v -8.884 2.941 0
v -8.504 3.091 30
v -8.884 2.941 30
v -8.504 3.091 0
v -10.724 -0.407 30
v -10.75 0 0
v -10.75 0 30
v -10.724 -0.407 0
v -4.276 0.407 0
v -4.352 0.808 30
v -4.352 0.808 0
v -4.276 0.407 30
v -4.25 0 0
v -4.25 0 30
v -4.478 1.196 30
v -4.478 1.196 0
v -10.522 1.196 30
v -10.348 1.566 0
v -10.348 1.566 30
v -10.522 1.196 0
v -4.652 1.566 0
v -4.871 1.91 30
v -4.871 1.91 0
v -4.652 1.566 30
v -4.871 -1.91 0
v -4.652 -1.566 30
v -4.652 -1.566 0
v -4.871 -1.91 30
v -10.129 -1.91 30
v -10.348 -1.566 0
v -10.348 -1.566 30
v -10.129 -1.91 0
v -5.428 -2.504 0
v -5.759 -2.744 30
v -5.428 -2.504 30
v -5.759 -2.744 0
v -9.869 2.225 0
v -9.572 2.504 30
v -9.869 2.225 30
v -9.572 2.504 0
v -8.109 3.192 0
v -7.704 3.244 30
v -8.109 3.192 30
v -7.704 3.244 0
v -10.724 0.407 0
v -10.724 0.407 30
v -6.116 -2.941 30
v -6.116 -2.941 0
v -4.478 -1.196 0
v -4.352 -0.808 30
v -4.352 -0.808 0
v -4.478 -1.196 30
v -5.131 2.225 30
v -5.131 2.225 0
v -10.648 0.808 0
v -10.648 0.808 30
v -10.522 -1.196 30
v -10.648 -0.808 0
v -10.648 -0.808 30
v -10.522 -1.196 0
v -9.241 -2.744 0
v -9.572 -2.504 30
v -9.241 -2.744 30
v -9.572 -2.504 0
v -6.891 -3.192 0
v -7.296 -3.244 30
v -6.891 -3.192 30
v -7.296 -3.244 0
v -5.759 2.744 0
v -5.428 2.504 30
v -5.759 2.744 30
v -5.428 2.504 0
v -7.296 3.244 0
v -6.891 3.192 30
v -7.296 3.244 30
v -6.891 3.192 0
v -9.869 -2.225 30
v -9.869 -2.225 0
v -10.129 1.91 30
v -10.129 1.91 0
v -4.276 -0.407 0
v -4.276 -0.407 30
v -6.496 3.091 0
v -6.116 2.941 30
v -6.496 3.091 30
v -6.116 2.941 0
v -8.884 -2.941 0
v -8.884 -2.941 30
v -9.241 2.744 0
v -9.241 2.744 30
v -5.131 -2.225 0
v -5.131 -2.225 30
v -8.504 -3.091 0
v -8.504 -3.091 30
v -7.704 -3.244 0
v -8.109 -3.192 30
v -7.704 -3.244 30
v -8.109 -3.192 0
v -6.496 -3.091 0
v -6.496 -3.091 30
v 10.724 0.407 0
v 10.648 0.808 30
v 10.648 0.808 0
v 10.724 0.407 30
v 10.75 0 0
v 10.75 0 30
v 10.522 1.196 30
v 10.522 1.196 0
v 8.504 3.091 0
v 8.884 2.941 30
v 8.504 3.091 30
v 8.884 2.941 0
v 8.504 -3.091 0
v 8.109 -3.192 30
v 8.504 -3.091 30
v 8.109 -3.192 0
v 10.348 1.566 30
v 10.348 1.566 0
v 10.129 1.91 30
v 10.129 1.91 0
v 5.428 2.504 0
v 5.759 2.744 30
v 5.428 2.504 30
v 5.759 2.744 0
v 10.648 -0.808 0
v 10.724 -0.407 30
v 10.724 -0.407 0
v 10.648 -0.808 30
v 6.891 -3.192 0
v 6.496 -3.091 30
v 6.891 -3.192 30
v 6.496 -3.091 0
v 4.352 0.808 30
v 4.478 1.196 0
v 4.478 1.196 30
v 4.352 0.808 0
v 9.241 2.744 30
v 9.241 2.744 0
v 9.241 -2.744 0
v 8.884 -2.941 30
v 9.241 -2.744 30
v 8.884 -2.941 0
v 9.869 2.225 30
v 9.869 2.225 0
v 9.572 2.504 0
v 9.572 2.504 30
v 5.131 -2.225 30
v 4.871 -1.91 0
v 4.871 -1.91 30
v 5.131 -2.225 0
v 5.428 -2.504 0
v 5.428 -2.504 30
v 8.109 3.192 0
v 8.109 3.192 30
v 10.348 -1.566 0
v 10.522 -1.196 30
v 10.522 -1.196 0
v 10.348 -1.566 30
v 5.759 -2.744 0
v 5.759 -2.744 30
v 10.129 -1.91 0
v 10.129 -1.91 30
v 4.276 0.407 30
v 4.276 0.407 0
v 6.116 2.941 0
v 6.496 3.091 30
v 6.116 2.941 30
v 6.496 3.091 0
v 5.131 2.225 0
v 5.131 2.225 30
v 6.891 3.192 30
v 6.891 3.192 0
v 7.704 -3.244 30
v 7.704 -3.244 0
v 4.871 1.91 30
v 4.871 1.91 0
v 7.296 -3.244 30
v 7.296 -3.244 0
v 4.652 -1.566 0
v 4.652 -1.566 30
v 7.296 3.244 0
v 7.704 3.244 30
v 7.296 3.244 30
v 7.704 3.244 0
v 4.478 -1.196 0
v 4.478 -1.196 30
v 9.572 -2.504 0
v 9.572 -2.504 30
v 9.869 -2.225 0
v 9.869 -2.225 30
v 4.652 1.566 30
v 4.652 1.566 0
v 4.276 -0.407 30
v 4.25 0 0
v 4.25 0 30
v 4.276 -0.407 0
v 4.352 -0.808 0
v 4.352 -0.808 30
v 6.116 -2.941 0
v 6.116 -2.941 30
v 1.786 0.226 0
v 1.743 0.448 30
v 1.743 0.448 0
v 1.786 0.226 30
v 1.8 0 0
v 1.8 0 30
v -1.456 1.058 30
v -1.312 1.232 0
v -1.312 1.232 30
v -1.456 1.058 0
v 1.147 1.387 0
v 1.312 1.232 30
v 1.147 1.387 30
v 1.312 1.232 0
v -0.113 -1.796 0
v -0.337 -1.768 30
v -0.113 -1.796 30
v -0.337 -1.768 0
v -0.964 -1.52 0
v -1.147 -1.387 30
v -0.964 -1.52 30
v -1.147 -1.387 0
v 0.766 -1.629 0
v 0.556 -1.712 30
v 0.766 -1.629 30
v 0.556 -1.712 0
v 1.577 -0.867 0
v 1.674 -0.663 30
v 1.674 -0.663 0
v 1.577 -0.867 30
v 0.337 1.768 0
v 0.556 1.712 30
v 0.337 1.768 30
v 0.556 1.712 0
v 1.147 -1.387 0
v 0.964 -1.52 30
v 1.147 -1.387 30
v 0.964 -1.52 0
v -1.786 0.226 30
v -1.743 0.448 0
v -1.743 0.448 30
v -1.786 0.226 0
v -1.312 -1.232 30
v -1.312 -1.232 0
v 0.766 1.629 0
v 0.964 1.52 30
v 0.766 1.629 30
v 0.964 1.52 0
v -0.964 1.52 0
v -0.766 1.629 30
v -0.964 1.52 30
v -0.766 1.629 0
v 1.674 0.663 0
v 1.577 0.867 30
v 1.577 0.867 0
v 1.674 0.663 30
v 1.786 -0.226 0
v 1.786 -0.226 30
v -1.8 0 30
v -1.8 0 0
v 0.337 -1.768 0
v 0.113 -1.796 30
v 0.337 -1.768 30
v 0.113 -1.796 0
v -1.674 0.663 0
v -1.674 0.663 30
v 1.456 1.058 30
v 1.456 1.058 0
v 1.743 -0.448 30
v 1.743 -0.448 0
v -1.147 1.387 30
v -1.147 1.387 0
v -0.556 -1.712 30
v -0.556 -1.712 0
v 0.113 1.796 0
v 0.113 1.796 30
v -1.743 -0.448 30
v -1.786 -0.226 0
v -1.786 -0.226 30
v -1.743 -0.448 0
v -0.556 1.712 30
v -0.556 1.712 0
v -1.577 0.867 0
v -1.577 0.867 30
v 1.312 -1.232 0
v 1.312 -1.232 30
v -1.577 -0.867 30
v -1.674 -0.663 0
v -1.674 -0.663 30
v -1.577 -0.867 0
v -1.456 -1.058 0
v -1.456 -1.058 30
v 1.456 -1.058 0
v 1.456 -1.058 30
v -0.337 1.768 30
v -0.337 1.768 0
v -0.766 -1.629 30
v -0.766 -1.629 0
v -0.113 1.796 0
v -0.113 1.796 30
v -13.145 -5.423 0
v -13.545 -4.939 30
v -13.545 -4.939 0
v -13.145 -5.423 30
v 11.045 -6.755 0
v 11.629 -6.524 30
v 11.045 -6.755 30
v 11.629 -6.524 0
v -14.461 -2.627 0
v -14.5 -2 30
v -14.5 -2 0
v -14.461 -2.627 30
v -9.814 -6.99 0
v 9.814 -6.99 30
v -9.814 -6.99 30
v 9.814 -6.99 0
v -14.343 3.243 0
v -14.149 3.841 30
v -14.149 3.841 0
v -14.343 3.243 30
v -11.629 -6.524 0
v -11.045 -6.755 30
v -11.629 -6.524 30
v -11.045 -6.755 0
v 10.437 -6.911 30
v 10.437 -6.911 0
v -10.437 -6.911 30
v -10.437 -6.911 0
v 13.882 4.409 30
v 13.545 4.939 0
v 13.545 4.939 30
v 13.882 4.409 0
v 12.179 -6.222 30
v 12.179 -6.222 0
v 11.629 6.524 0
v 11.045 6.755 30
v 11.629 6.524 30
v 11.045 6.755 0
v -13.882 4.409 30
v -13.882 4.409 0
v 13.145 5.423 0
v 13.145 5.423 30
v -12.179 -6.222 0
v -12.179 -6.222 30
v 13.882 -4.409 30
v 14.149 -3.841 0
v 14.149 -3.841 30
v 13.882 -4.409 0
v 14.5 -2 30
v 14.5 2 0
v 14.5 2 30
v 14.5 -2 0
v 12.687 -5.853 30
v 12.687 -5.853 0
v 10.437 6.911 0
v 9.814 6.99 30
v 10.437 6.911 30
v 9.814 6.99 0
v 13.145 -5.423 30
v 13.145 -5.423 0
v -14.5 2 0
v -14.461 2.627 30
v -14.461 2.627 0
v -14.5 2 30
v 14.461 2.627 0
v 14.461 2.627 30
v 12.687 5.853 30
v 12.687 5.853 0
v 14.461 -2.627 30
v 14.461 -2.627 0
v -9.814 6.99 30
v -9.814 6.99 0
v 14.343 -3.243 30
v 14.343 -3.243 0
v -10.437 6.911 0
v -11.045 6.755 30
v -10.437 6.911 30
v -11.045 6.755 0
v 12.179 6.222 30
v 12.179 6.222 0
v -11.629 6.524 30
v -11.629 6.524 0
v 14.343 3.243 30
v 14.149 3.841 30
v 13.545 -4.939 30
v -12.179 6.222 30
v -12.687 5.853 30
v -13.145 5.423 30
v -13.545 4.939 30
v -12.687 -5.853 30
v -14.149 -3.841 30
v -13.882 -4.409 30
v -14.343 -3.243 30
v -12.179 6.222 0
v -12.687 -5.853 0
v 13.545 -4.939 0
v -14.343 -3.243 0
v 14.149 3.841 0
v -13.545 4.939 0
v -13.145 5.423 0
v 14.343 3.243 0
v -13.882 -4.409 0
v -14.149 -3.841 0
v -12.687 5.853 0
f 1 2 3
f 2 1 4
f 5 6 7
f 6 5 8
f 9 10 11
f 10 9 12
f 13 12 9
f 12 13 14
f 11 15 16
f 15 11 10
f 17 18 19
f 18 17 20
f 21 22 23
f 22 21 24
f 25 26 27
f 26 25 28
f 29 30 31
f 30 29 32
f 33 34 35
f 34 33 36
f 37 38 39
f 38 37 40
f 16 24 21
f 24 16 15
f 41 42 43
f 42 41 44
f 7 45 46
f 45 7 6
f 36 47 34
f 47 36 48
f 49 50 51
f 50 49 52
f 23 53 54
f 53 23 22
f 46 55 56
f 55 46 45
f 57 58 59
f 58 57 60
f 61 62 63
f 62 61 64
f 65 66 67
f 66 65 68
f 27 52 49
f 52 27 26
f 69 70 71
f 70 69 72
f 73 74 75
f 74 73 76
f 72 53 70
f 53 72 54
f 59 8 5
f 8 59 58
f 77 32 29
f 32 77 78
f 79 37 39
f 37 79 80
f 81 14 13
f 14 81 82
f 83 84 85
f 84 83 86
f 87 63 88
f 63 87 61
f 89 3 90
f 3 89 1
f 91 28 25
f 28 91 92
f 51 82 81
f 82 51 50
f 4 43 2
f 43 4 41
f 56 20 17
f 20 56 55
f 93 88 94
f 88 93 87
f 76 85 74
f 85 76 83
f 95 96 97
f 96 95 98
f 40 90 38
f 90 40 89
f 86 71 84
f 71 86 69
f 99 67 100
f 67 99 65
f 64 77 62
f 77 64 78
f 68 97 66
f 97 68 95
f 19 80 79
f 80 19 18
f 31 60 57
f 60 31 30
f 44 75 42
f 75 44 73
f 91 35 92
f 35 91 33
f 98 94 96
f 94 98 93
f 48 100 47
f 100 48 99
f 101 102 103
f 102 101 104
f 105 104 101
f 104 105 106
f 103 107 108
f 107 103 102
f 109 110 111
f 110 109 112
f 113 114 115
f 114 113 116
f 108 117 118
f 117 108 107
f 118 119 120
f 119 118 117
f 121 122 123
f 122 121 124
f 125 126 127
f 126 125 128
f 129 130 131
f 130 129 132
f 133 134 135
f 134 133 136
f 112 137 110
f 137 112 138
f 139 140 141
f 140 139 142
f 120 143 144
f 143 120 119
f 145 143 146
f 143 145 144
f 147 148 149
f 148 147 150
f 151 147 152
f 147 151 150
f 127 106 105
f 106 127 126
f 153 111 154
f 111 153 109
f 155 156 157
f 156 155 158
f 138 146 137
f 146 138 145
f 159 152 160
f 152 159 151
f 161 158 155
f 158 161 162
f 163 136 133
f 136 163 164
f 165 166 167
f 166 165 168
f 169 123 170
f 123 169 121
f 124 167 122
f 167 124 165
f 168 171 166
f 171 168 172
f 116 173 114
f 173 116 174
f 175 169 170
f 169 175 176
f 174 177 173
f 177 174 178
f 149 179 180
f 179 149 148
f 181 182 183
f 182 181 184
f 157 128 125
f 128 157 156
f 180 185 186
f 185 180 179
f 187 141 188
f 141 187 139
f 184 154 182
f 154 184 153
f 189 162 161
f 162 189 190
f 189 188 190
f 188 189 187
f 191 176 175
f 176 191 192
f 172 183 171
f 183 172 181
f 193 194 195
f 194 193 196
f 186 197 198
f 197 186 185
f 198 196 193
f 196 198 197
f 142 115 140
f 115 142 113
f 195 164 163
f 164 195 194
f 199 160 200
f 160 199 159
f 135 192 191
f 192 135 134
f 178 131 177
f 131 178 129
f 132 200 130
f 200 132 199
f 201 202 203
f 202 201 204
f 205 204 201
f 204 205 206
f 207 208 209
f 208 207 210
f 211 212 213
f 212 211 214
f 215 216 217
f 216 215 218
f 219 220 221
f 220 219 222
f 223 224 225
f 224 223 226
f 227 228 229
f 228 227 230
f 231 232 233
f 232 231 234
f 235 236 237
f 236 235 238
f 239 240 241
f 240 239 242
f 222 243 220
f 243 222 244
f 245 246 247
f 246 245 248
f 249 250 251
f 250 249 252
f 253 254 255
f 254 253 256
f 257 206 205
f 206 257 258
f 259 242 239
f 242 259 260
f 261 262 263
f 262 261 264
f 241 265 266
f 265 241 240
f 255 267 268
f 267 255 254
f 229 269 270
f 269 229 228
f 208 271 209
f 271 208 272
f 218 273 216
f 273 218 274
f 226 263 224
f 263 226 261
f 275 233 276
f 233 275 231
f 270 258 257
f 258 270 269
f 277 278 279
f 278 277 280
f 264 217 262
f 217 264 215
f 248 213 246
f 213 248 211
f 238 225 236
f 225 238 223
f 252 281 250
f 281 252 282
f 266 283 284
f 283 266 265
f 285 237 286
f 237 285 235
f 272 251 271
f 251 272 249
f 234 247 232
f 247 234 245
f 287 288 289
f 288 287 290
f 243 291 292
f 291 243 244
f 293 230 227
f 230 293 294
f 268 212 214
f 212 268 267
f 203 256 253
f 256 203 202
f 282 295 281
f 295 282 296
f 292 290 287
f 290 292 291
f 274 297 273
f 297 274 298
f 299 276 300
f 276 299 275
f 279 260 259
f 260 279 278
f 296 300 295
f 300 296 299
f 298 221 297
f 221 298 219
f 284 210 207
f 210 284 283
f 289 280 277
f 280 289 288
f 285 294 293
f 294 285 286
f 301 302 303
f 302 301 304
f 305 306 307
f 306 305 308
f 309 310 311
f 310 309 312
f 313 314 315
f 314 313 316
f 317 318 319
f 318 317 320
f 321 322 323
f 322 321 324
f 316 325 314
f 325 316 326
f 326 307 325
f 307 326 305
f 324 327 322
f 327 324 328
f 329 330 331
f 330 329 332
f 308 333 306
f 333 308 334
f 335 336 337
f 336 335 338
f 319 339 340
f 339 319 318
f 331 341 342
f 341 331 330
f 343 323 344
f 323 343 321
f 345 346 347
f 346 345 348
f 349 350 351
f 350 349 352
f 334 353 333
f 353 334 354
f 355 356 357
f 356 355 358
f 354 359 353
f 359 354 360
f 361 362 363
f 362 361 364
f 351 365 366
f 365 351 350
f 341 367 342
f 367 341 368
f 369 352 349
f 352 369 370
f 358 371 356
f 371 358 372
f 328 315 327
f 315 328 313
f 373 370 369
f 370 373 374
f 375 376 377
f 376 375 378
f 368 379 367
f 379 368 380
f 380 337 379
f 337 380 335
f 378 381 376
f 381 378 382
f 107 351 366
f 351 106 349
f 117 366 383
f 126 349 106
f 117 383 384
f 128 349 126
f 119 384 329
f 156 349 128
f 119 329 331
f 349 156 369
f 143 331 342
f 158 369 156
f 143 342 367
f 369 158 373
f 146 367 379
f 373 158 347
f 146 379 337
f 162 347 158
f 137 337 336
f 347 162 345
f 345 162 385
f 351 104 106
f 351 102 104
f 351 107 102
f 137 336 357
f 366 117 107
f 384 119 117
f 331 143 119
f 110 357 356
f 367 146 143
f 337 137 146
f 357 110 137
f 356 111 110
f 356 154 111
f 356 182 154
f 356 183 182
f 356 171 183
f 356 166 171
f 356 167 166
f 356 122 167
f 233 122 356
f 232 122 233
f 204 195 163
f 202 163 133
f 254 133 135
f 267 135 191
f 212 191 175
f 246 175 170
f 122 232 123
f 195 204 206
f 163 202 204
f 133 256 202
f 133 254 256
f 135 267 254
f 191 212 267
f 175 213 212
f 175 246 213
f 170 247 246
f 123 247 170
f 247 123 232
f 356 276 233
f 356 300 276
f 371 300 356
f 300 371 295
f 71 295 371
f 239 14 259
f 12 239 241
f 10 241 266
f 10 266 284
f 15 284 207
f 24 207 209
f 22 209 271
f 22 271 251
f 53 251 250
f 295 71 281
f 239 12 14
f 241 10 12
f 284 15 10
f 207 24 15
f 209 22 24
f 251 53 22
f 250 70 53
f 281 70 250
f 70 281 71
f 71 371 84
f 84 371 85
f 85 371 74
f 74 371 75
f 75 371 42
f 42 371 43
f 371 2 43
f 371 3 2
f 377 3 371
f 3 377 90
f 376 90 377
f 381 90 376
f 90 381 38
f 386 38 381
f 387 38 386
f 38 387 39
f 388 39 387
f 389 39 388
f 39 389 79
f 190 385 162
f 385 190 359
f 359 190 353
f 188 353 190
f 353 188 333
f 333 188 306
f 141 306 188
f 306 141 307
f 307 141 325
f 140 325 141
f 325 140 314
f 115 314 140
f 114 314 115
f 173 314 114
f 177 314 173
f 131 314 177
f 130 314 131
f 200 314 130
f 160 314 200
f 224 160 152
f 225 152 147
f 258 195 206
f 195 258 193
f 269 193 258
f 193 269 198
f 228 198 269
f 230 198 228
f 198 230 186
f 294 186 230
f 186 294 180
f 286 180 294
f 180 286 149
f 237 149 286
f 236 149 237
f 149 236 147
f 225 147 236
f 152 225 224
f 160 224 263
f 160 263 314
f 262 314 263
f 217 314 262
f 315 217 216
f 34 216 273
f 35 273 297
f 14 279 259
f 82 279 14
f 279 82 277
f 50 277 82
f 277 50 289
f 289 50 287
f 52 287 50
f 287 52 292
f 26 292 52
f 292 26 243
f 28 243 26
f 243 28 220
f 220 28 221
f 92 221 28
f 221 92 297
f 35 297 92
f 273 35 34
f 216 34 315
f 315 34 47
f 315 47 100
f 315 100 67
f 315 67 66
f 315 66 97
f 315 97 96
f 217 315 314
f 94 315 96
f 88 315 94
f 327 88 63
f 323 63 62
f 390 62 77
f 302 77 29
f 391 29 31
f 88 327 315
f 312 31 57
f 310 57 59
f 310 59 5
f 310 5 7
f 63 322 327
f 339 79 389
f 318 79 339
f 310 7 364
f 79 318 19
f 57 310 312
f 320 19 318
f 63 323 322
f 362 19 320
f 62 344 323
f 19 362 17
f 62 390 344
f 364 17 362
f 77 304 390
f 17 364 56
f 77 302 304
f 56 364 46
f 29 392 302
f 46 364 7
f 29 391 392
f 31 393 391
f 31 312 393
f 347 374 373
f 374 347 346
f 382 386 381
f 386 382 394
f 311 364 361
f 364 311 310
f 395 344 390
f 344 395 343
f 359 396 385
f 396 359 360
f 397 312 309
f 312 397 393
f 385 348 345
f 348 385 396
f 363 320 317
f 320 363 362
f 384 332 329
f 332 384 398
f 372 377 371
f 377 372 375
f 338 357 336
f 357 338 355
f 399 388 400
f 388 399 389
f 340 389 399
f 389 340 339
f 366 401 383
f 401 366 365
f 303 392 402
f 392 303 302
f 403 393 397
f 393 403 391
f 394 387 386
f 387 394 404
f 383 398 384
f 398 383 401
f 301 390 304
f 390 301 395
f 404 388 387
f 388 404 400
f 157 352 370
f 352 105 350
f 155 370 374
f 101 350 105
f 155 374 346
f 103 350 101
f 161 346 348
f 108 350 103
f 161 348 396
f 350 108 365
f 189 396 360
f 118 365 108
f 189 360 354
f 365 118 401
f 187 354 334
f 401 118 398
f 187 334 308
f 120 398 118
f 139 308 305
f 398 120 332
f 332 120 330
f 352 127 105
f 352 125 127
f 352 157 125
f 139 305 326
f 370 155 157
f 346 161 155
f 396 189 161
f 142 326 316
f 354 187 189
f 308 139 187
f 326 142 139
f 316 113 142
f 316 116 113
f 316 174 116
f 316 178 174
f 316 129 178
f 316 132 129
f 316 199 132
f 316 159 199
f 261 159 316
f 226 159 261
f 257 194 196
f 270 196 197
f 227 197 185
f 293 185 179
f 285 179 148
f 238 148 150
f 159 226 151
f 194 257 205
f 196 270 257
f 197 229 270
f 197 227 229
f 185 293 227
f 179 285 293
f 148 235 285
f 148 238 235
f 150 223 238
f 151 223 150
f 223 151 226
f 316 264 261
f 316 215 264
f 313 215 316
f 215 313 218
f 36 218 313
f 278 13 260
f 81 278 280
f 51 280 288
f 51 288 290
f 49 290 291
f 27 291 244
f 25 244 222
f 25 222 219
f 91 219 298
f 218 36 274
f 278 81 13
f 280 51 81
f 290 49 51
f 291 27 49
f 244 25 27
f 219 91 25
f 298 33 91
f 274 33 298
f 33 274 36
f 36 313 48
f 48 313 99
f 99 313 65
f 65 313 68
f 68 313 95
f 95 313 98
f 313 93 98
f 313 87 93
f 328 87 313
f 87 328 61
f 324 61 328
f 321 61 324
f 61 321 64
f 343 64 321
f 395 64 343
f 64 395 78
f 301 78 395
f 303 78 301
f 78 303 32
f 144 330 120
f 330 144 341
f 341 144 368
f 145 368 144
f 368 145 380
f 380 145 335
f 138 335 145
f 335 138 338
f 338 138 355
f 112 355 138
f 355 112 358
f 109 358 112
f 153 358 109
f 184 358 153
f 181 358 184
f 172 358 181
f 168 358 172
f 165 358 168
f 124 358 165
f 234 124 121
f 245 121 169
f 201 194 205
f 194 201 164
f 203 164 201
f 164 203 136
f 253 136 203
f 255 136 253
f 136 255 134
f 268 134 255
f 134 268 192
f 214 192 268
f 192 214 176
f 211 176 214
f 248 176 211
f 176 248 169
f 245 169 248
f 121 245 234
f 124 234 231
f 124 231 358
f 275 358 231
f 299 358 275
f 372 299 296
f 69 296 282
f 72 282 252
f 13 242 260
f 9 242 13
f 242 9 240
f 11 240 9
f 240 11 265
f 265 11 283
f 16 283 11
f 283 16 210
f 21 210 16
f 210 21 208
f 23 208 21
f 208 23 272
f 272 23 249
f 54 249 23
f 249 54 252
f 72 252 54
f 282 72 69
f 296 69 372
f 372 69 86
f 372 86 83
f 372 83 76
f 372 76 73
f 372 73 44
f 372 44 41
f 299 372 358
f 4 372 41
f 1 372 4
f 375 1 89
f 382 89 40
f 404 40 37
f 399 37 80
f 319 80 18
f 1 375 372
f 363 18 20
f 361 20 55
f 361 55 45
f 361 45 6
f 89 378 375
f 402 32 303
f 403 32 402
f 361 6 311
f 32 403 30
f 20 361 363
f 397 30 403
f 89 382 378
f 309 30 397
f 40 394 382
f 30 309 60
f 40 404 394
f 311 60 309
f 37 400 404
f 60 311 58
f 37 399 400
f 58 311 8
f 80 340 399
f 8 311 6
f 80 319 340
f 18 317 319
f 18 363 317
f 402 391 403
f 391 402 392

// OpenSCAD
$fn = 50;


difference() {
	union() {
		*color(alpha = 1.0000000000, c = "gray") {
			translate(v = [0, 7, 0]) {
				linear_extrude(height = 1) {
					text(font = "Arial:style=Bold", halign = "center", size = 4.5000000000, text = "COMMENT plate main", valign = "center");
				}
			}
		}
		hull() {
			translate(v = [-9.5000000000, 2.0000000000, 0]) {
				cylinder(h = 30, r = 5);
			}
			translate(v = [9.5000000000, 2.0000000000, 0]) {
				cylinder(h = 30, r = 5);
			}
			translate(v = [-9.5000000000, -2.0000000000, 0]) {
				cylinder(h = 30, r = 5);
			}
			translate(v = [9.5000000000, -2.0000000000, 0]) {
				cylinder(h = 30, r = 5);
			}
		}
	}
	union() {
		*color(alpha = 1.0000000000, c = "gray") {
			translate(v = [0, 7, 0]) {
				linear_extrude(height = 1) {
					text(font = "Arial:style=Bold", halign = "center", size = 4.5000000000, text = "COMMENT holes main", valign = "center");
				}
			}
		}
		translate(v = [-7.5000000000, 0.0000000000, 0]) {
			translate(v = [0, 0, -100]) {
				cylinder(h = 200, r = 3.2500000000);
			}
		}
		translate(v = [7.5000000000, 0.0000000000, 0]) {
			translate(v = [0, 0, -100]) {
				cylinder(h = 200, r = 3.2500000000);
			}
		}
		translate(v = [-7.5000000000, 0.0000000000, 0]) {
			translate(v = [0, 0, -100]) {
				cylinder(h = 200, r = 1.8000000000);
			}
		}
		translate(v = [0, 0, -100]) {
			cylinder(h = 200, r = 1.8000000000);
		}
		translate(v = [7.5000000000, 0.0000000000, 0]) {
			translate(v = [0, 0, -100]) {
				cylinder(h = 200, r = 1.8000000000);
			}
		}
	}
}
